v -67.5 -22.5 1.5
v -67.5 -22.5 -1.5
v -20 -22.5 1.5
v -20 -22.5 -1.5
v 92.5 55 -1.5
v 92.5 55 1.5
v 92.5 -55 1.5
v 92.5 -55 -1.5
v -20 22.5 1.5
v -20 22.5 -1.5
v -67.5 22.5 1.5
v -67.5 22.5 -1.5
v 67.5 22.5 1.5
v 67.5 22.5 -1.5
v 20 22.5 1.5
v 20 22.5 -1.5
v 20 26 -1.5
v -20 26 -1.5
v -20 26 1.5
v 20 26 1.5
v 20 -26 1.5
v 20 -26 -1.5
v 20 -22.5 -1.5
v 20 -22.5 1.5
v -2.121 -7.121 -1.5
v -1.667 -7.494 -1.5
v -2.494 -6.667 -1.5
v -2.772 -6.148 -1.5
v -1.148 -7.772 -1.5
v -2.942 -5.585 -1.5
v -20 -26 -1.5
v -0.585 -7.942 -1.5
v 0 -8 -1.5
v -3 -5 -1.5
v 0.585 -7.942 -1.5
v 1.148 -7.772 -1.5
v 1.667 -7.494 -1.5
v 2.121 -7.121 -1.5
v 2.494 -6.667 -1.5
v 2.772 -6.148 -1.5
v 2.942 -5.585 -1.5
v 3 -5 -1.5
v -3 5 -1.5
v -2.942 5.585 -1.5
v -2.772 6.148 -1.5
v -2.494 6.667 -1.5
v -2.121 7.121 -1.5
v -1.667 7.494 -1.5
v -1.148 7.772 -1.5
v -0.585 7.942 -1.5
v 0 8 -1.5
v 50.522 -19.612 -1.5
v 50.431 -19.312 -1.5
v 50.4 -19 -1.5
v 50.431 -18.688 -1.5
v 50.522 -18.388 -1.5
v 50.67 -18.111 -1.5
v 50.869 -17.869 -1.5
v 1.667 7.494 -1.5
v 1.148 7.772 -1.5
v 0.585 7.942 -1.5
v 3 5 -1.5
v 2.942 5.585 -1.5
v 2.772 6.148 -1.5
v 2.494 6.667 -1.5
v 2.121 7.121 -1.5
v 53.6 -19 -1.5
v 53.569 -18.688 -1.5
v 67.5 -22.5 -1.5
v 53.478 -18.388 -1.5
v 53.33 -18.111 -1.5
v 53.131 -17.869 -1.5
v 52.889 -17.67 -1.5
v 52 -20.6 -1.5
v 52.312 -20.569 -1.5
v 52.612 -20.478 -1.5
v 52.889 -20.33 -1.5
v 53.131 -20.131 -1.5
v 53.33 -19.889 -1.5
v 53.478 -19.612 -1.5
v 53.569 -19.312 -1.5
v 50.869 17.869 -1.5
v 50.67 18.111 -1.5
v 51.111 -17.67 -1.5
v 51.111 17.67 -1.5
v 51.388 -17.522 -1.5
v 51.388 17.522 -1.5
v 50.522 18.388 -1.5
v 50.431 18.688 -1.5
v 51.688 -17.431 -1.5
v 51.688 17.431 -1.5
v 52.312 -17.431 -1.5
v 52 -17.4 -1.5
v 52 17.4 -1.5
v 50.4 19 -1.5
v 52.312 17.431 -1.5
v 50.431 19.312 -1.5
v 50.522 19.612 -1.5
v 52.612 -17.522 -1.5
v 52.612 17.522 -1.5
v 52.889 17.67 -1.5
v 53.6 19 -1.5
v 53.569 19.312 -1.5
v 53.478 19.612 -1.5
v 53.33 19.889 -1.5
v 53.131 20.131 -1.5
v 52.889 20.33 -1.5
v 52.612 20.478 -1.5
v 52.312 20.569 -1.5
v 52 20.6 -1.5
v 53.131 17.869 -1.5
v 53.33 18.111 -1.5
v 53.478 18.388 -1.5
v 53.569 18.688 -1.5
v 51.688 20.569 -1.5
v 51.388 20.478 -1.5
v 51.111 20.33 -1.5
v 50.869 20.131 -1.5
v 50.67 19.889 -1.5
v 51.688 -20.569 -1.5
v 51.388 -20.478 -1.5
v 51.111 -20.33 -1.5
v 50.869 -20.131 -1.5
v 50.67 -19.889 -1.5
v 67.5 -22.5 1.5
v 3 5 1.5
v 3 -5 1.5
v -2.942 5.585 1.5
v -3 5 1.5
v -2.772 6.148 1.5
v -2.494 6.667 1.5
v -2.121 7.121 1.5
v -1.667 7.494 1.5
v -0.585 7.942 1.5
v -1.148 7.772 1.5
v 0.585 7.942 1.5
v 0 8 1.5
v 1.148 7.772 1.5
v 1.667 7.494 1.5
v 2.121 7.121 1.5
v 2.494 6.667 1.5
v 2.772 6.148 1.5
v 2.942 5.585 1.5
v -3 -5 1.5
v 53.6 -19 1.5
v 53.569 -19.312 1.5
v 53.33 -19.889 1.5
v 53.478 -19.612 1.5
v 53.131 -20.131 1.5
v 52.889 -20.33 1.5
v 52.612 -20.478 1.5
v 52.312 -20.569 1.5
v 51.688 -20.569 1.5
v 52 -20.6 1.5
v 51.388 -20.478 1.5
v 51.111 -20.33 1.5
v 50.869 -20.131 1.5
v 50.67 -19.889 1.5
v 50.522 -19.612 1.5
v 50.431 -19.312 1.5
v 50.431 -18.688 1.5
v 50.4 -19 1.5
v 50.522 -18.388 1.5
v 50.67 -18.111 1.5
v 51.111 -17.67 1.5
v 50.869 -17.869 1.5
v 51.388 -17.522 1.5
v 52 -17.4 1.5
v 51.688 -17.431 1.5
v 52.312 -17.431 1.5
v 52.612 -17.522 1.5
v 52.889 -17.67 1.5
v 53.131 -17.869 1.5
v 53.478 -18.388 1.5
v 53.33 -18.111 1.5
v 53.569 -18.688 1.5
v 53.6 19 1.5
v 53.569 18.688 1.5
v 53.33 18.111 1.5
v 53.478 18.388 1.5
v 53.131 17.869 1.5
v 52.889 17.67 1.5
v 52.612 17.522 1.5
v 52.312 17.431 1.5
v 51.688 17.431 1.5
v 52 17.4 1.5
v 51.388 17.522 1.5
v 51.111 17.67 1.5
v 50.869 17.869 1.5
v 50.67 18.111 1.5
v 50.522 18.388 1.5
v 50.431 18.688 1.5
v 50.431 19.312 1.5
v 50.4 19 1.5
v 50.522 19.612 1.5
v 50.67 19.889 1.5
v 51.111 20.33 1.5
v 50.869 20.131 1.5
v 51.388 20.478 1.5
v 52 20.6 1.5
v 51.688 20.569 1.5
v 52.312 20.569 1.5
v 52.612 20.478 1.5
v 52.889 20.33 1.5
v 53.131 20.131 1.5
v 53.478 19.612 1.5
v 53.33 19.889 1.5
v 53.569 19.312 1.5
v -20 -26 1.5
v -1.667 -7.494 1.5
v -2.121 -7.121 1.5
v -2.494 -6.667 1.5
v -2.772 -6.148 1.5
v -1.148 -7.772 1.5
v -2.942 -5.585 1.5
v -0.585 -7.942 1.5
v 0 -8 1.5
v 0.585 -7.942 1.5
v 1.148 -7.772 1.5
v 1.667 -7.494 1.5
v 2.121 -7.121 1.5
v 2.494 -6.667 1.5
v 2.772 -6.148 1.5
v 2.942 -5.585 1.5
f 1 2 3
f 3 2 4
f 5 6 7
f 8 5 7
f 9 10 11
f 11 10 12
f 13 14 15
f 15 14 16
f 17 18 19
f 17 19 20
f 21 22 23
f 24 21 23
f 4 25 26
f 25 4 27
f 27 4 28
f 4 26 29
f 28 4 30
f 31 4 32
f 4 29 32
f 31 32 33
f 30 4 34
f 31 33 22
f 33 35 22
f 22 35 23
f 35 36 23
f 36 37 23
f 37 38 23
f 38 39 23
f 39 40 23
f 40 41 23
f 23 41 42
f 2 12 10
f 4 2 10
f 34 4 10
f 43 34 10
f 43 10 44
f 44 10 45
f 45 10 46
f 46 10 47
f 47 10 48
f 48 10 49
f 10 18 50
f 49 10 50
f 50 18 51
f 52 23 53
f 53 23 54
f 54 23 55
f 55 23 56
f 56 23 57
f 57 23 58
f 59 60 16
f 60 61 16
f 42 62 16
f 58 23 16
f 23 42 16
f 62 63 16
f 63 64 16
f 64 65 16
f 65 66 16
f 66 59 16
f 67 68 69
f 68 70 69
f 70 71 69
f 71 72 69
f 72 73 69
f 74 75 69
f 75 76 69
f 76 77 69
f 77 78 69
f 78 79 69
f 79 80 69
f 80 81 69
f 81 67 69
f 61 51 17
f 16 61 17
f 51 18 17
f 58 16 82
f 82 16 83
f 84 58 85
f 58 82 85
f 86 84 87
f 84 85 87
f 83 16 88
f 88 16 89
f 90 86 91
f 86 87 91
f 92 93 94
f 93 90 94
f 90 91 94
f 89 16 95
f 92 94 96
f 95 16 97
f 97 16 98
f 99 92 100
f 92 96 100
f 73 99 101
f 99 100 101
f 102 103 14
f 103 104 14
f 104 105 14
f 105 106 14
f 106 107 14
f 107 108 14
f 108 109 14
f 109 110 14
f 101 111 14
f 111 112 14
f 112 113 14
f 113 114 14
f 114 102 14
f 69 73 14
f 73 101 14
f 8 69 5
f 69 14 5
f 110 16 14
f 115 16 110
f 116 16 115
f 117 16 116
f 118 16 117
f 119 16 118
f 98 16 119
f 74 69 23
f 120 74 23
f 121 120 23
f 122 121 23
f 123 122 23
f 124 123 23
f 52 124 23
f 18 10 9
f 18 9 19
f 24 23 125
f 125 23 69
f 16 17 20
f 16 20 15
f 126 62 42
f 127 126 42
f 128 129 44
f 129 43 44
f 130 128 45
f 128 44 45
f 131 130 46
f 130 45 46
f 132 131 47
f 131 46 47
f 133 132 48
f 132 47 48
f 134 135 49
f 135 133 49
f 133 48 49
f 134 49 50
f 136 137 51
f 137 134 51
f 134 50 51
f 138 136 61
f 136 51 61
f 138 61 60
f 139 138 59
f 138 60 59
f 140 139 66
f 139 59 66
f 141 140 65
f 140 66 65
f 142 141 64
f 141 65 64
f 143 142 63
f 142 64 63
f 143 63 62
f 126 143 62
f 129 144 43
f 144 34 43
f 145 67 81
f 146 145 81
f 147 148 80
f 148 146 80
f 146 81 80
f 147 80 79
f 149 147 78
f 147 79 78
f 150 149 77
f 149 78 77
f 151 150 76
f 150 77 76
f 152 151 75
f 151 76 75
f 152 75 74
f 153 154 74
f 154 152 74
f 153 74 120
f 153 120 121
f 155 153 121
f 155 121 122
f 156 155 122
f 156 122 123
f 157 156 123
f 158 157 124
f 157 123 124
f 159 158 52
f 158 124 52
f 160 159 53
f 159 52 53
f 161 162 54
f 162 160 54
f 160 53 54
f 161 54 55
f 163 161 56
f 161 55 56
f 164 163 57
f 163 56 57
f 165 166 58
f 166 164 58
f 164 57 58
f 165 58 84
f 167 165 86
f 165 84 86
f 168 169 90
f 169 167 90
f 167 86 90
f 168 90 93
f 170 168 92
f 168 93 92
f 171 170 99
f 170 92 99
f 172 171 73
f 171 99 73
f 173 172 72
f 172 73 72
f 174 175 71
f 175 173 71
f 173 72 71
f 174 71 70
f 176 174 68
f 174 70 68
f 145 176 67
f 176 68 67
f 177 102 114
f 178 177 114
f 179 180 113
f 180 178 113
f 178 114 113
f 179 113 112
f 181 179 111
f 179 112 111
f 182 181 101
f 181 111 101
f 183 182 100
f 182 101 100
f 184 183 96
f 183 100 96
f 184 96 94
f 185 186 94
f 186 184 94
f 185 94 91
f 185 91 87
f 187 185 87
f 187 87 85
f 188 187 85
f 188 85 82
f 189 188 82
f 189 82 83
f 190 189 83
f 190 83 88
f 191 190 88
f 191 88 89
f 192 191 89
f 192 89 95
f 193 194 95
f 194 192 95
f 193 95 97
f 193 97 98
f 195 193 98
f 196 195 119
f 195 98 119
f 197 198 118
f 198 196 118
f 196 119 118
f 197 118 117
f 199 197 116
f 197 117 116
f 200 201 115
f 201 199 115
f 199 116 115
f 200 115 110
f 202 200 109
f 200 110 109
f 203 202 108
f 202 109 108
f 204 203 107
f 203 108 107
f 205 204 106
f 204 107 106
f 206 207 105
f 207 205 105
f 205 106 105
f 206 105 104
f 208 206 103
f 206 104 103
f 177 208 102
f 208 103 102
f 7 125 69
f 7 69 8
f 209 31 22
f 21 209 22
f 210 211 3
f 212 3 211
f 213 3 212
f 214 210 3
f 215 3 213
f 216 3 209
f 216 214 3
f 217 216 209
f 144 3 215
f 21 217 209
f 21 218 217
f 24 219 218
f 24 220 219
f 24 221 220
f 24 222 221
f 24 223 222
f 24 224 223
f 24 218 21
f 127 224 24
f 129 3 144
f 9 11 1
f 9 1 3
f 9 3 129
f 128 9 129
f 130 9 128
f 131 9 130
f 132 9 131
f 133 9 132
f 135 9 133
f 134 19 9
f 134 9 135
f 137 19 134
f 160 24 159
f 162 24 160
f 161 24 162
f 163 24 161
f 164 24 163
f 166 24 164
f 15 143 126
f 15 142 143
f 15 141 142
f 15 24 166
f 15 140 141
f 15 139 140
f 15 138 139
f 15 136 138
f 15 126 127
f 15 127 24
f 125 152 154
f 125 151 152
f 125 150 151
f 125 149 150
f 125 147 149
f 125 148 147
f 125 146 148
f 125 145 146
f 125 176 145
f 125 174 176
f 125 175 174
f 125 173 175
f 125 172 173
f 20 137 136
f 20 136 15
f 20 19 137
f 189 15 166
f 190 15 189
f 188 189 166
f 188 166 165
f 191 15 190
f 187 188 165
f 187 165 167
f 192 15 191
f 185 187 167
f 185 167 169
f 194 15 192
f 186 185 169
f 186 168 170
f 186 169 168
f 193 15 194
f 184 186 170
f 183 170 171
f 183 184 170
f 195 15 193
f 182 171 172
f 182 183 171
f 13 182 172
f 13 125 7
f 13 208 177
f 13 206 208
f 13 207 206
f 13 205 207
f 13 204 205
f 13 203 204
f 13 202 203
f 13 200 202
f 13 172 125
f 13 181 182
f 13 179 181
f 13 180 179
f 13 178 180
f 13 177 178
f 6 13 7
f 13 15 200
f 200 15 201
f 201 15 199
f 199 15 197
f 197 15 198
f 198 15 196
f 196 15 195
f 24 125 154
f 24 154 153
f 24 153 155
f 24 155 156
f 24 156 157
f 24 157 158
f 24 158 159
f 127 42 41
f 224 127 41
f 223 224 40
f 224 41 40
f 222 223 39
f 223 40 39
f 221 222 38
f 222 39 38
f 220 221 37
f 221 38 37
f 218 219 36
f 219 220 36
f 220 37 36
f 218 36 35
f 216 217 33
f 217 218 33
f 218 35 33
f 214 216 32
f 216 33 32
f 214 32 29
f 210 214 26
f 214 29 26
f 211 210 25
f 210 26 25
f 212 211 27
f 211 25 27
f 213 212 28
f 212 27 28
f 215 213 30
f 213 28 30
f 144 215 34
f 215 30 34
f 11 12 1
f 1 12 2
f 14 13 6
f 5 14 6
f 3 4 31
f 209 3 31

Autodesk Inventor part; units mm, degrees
ref_plane "YZ Plane" through (0, 0, 0) normal (1, 0, 0) x (0, 1, 0)
ref_plane "XZ Plane" through (0, 0, 0) normal (0, 1, 0) x (-1, 0, 0)
ref_plane "XY Plane" through (0, 0, 0) normal (0, 0, 1) x (1, 0, 0)
sketch "Sketch1" plane through (0, 0, 0) normal (0, 0, 1) x (1, 0, 0)
  line L0 (-67.5, -22.5) -> (67.5, -22.5)
  line L1 (67.5, -22.5) -> (67.5, 22.5)
  line L2 (67.5, 22.5) -> (-67.5, 22.5)
  line L3 (-67.5, 22.5) -> (-67.5, -22.5)
  line L4 (-67.5, -22.5) -> (67.5, 22.5) construction
  line L5 (67.5, -22.5) -> (-67.5, 22.5) construction
  line L6 (0, -5) -> (0, 5) construction
  line L7 (-3, -5) -> (-3, 5)
  line L8 (3, 5) -> (3, -5)
  arc A0 (-3, -5) -> (3, -5) centre (0, -5) ccw
  arc A1 (3, 5) -> (-3, 5) centre (0, 5) ccw
  line L9 (0, 0) -> (67.5, 0)
  circle A2 centre (52, 19) radius 1.6
  line L10 (-20, 26) -> (20, 26)
  line L11 (20, 26) -> (20, 22.5)
  line L12 (20, 22.5) -> (-20, 22.5)
  line L13 (-20, 22.5) -> (-20, 26)
  line L14 (-20, 26) -> (20, 22.5) construction
  line L15 (20, 26) -> (-20, 22.5) construction
  line L16 (-20, -26) -> (20, -26)
  line L17 (20, -26) -> (20, -22.5)
  line L18 (20, -22.5) -> (-20, -22.5)
  line L19 (-20, -22.5) -> (-20, -26)
  line L20 (-20, -26) -> (20, -22.5) construction
  line L21 (20, -26) -> (-20, -22.5) construction
  circle A3 centre (52, -19) radius 1.6
  point P0 (0, -8)
  point P1 (0, 8)
  point P2 (0, 24.25)
  point P3 (0, 22.5)
  point P4 (0, 22.5)
  point P5 (0, -24.25)
  point P6 (0, -22.5)
  point P7 (0, -22.5)
  dimension "d0" = 135
  dimension "d1" = 45
  dimension "d13" = 16
  dimension "d14" = 3
  dimension "d15" = 3.2
  dimension "d16" = 55
  dimension "d17" = 38
  dimension "d18" = 40
  dimension "d19" = 3.5
sketch "Sketch2" plane through (0, 0, 1.5) normal (0, 0, 1) x (1, 0, 0)
  line L0 (67.5, -22.5) -> (67.5, 22.5)
  line L1 (67.5, -22.5) -> (92.5, -55)
  line L2 (67.5, 0) -> (0, 0)
  line L3 (67.5, 22.5) -> (92.5, 55)
  line L4 (92.5, 55) -> (92.5, -55)
  dimension "d20" = 25
  dimension "d21" = 110
extrude "Plate1" add sketch "Sketch1" along normal mid plane 3
sheet face with bend "Face2" sketch "Sketch2" thickness 3 toward (0, 0, -1) bend radius 3
bend "Bend1"
equation "\"d9\" = Thickness"
equation "\"d22\" = BendRadius"
equation "\"d23\" = BendReliefWidth"
equation "\"d25\" = MinimumRemnant"
equation "\"d24\" = BendReliefDepth"
equation "\"d26\" = TransitionRadius"
equation "\"BendRadius\" = Thickness"
equation "\"BendReliefWidth\" = Thickness"
equation "\"BendReliefDepth\" = 0.5 * Thickness"
equation "\"CornerReliefSize\" = 4 * Thickness"
equation "\"MinimumRemnant\" = 2 * Thickness"
equation "\"TransitionRadius\" = BendRadius"
equation "\"JacobiRadiusSize\" = BendRadius"
equation "\"GapSize\" = Thickness"
equation "\"Thickness\" = 3"
properties part number "Path"
